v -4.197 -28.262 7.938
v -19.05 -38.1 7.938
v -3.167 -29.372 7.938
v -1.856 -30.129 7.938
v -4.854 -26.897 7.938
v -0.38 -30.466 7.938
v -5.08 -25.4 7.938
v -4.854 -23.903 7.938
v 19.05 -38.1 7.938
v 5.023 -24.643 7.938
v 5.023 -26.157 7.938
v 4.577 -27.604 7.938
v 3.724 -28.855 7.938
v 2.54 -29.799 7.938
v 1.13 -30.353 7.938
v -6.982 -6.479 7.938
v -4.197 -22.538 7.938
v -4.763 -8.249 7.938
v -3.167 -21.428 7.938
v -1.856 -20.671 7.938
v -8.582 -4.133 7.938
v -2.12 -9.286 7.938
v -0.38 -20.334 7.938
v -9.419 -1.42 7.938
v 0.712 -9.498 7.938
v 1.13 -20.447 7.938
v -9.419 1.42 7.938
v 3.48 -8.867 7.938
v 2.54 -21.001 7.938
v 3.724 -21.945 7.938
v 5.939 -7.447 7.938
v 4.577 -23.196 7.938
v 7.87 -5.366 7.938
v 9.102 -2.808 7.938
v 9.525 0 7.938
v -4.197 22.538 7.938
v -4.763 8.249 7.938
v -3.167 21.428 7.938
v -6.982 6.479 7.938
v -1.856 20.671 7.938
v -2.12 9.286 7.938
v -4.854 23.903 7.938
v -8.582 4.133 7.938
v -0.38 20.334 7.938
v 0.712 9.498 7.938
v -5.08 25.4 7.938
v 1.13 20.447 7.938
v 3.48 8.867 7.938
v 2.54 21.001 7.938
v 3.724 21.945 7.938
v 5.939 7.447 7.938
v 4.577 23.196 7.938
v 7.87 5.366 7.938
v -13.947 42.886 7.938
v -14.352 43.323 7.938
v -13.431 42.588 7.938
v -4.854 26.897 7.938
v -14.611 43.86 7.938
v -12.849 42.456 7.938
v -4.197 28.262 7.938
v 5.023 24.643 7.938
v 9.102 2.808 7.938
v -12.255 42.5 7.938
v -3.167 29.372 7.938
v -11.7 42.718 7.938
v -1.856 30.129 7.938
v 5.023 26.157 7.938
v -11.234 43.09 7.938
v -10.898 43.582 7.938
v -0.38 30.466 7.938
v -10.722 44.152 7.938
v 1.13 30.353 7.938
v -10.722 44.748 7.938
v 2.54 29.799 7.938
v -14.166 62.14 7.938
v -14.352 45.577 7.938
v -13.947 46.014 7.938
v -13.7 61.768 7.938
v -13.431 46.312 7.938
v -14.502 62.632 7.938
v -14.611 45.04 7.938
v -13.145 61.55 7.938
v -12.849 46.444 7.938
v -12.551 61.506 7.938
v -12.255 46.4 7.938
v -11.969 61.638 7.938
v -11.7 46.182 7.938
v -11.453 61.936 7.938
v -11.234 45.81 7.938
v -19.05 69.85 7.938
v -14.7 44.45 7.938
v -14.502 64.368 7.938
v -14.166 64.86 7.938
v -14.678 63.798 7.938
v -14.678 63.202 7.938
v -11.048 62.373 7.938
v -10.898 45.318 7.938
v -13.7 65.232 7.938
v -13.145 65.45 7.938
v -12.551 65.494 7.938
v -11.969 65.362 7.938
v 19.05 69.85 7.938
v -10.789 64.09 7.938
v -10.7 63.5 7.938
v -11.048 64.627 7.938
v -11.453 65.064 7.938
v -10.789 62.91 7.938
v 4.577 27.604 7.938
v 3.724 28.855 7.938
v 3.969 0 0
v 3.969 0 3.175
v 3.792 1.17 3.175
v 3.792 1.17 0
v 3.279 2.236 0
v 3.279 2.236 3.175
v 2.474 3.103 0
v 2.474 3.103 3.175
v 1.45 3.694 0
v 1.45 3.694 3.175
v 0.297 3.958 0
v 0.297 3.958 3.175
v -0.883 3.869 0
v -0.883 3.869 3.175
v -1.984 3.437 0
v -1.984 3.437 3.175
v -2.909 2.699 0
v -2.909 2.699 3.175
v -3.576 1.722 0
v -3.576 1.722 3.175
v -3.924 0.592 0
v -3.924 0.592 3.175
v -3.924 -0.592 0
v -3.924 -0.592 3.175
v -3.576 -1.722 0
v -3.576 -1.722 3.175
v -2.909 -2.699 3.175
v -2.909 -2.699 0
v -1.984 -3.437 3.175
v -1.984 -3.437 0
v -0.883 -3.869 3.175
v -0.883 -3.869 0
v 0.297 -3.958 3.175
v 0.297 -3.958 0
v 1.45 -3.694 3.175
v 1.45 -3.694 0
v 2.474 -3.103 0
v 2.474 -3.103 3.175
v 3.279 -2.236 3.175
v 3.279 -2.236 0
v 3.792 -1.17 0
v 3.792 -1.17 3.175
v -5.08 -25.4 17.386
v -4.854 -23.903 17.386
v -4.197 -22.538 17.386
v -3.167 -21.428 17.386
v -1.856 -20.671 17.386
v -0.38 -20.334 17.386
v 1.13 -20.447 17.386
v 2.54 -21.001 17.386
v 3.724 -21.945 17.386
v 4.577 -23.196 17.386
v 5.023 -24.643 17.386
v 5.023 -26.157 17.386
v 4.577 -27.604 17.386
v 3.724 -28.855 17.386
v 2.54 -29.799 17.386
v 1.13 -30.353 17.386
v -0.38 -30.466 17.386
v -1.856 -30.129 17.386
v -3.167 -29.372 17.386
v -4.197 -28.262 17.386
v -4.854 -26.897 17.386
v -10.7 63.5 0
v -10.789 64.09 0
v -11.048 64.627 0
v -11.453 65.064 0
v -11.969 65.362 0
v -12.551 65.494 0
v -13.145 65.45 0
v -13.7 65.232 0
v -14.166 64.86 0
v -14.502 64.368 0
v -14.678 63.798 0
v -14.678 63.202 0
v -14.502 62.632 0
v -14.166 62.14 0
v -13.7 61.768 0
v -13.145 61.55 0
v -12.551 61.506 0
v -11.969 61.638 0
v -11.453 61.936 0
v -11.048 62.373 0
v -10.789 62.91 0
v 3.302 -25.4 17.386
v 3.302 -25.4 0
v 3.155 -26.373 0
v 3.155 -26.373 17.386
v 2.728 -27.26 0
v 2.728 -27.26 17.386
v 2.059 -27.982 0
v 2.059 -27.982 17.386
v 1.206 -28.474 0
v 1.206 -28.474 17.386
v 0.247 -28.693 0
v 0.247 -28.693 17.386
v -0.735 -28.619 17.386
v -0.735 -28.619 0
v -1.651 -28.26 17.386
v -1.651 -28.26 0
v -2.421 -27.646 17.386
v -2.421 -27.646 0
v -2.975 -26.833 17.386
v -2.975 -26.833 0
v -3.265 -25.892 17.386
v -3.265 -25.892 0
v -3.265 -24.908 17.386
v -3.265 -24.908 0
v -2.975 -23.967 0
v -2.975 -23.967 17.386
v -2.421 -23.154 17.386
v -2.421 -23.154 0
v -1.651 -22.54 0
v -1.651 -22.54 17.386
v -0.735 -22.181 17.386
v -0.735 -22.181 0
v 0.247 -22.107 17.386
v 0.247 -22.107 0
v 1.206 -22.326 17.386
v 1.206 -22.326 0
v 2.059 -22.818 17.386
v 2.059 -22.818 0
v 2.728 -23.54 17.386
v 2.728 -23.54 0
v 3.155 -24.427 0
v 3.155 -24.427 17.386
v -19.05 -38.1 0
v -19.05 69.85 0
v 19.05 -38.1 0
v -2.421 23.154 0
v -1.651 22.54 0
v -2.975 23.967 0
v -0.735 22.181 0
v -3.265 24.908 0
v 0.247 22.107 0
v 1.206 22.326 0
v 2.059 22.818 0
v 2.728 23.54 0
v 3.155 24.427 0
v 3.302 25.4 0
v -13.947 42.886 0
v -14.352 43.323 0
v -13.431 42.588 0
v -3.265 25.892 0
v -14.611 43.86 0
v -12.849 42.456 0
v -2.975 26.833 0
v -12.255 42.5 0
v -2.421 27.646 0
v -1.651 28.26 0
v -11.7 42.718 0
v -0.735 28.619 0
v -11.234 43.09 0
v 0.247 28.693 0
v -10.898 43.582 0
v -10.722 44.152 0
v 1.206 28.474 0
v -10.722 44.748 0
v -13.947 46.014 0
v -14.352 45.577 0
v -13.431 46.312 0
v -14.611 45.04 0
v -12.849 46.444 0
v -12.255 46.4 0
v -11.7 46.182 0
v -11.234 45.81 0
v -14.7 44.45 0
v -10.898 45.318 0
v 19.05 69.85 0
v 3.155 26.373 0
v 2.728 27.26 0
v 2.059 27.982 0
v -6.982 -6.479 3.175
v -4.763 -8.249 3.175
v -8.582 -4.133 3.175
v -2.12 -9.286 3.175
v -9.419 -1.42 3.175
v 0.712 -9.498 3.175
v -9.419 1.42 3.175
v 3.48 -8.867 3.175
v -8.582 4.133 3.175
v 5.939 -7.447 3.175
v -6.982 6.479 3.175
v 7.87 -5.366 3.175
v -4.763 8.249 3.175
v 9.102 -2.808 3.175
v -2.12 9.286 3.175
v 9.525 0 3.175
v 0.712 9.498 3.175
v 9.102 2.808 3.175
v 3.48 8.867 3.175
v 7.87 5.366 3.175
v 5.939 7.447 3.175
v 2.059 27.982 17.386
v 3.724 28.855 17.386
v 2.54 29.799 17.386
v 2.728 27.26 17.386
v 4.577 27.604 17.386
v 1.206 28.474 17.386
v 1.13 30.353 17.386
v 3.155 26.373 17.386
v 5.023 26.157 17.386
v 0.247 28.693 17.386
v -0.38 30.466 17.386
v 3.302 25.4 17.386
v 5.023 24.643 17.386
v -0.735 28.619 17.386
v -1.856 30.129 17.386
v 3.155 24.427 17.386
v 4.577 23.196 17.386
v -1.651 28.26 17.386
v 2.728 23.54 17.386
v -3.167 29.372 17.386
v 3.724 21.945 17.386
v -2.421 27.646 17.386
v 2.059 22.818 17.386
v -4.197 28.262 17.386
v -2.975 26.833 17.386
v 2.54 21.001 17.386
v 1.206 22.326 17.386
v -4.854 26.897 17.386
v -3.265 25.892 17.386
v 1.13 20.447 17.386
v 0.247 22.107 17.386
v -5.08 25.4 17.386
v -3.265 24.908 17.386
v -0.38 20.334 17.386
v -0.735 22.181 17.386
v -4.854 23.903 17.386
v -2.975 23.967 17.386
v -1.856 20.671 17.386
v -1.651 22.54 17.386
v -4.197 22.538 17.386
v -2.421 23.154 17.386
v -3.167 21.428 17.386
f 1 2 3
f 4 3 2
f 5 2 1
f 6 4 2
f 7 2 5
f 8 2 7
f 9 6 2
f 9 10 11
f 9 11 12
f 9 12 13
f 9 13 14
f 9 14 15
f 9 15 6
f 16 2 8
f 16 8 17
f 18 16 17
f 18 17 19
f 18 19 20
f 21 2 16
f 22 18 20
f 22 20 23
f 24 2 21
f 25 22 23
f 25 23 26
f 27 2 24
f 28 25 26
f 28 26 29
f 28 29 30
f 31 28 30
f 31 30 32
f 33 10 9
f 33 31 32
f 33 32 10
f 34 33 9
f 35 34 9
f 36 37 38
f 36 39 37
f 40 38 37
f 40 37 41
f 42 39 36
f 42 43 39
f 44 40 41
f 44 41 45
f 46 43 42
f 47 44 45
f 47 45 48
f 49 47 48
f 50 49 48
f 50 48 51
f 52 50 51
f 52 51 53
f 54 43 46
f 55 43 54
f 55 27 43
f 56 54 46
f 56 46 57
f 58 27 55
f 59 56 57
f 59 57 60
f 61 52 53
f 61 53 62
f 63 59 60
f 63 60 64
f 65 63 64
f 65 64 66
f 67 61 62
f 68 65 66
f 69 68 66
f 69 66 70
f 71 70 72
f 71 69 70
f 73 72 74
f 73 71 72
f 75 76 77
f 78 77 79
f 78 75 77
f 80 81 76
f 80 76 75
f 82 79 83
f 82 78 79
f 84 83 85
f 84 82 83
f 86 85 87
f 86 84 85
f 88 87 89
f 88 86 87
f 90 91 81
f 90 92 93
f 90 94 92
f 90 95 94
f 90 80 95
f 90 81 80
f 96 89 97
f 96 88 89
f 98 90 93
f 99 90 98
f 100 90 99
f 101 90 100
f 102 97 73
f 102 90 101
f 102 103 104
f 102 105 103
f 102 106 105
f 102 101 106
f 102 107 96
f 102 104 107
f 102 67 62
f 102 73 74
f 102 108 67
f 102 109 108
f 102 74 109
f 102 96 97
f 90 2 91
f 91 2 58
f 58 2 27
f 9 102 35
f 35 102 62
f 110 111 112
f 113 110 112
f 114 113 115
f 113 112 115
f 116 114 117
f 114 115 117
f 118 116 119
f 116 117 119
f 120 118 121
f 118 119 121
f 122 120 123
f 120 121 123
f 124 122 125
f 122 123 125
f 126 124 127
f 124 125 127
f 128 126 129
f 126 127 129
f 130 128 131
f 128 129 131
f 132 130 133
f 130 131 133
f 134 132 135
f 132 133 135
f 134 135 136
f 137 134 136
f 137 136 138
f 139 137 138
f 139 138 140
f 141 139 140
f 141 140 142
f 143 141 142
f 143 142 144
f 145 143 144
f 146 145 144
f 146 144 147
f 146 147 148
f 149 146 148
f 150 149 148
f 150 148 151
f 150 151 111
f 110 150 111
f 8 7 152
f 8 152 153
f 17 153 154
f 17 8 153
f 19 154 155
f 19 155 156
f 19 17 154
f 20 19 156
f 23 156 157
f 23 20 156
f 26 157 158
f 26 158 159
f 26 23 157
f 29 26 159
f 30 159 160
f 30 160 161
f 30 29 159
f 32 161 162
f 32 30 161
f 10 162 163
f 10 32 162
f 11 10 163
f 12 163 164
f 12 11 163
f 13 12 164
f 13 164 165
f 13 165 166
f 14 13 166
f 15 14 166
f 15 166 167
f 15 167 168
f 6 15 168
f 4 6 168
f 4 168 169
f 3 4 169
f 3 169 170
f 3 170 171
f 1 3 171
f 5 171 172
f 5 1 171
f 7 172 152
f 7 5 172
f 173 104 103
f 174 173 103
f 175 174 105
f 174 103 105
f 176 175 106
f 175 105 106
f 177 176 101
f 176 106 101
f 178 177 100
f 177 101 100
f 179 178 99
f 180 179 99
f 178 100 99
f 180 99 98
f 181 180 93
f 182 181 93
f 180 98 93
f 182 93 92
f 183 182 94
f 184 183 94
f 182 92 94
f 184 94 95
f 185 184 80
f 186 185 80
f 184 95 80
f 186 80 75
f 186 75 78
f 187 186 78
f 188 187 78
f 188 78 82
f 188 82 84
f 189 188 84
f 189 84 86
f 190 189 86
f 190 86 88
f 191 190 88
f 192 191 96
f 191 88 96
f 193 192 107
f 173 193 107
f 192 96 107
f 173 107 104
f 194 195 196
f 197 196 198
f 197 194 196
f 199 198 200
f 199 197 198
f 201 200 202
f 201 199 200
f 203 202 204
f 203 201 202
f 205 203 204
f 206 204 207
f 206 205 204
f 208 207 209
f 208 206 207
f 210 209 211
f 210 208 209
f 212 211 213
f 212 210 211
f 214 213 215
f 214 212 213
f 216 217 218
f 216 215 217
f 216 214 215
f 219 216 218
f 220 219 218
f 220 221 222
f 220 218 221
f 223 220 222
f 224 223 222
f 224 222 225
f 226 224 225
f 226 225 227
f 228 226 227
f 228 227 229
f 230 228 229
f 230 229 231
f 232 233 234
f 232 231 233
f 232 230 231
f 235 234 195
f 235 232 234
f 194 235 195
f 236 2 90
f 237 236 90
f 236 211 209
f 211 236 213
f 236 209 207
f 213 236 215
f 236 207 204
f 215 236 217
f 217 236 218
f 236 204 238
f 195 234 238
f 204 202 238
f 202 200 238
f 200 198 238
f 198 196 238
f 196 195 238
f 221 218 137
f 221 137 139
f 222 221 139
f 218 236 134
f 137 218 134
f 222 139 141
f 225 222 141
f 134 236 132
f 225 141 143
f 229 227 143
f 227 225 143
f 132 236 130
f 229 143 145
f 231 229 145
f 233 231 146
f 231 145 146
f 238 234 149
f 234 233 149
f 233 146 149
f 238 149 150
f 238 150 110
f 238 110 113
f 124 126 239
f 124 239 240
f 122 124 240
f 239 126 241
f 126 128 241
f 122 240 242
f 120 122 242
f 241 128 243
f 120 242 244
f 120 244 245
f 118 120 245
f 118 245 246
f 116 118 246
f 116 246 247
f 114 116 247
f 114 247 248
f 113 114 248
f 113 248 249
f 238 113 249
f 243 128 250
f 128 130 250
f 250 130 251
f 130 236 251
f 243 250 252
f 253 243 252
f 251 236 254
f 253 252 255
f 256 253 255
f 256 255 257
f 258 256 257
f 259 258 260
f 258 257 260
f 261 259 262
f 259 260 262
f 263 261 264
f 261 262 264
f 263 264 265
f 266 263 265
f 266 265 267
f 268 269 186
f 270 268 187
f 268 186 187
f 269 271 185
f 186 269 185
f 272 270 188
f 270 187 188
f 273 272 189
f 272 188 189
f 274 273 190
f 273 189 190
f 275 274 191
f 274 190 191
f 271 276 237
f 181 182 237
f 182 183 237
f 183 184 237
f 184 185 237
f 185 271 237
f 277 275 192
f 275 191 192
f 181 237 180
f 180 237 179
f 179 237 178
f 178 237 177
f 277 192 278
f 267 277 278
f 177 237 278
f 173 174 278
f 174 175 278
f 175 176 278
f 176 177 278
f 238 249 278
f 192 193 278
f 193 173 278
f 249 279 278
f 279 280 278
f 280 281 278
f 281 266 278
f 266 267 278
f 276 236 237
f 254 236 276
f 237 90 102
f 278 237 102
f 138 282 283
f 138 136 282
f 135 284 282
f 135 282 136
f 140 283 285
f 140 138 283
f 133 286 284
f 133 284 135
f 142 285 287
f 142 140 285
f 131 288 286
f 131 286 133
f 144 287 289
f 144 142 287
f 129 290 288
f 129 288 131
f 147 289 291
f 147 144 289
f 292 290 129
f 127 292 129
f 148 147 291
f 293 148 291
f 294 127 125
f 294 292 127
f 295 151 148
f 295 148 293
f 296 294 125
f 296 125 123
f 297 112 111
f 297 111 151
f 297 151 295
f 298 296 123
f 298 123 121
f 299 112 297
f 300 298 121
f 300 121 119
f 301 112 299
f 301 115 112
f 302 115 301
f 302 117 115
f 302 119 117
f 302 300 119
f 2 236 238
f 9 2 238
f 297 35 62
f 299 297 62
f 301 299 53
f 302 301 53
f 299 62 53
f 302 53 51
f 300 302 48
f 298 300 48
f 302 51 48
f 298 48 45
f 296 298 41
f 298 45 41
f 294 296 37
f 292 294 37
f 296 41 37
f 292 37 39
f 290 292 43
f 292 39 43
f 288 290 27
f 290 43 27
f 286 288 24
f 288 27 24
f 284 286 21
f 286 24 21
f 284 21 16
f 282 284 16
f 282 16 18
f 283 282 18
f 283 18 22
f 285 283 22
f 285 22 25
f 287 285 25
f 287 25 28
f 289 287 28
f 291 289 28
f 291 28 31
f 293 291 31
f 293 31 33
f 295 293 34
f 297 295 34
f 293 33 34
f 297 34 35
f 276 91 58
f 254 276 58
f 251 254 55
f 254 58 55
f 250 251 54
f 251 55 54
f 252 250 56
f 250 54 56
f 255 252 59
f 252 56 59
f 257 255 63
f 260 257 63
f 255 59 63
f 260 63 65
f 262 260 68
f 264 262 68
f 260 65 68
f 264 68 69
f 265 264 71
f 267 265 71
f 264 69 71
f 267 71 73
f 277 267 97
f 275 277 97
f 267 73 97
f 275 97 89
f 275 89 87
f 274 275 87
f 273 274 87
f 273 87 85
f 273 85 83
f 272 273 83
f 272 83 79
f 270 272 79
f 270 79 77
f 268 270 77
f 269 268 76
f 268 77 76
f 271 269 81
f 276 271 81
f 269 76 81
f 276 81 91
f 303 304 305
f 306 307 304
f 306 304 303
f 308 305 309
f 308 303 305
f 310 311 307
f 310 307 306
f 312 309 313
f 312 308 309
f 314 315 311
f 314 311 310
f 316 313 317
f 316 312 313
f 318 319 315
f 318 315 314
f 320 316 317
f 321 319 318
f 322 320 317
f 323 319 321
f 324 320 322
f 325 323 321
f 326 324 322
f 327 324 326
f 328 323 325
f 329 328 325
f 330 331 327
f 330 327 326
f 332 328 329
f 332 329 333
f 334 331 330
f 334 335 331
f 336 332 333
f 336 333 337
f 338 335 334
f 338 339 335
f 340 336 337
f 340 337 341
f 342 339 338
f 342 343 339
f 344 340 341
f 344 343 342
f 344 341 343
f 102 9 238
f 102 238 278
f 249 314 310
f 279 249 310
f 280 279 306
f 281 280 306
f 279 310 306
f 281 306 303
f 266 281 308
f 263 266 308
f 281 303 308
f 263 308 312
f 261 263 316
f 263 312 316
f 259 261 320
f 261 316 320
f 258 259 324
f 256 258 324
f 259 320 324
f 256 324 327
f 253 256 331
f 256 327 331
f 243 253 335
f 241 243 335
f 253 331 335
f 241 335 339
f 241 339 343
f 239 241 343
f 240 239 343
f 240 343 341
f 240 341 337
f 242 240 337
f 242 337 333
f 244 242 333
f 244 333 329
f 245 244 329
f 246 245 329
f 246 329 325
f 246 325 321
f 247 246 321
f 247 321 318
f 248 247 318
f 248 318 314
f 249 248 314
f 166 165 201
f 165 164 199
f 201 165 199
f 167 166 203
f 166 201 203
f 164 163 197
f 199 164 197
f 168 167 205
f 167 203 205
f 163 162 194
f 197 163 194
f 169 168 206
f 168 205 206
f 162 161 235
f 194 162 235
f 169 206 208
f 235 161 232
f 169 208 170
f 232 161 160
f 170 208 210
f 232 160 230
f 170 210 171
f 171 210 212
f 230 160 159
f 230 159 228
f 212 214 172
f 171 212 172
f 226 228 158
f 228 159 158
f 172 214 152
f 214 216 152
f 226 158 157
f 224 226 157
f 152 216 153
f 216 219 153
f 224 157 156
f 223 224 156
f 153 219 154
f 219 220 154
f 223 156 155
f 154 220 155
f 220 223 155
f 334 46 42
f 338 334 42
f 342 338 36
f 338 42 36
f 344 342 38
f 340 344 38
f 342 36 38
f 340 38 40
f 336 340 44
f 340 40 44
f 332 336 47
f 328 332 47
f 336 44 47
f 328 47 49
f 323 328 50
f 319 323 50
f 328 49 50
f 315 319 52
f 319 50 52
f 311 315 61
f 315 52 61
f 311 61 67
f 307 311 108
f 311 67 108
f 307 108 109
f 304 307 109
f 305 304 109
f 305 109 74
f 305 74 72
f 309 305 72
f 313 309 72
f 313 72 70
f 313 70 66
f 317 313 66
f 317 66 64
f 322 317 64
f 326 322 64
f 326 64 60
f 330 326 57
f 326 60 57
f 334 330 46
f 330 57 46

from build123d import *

# Parameters (mm, degrees)
SKETCH1_W           = 38.1
SKETCH1_H           = 76.2
BOSS_EXTRUDE1_DEPTH = 7.9375
SKETCH2_R           = 3.96875
CUT_EXTRUDE1_DEPTH  = 44.330317403
SKETCH4_R           = 9.525
CUT_EXTRUDE2_DEPTH  = 4.7625
SKETCH5_R           = 5.08
BOSS_EXTRUDE2_DEPTH = 9.4488
SKETCH6_R           = 3.302
CUT_EXTRUDE3_DEPTH  = 47.008650575
SKETCH7_W           = 38.1
SKETCH7_H           = 31.75
SKETCH7_R           = 2
BOSS_EXTRUDE4_DEPTH = 7.9375


with BuildPart() as part:
    # Sketch1 → Boss-Extrude1 (new body)
    with BuildSketch(Plane.XY):
        Rectangle(SKETCH1_W, SKETCH1_H)
    extrude(amount=BOSS_EXTRUDE1_DEPTH)

    # Sketch2 → Cut-Extrude1 (cut, through all)
    with BuildSketch(Plane.XY.offset(7.9375)):
        Circle(SKETCH2_R)
    extrude(amount=-CUT_EXTRUDE1_DEPTH, mode=Mode.SUBTRACT)

    # Sketch4 → Cut-Extrude2 (cut)
    with BuildSketch(Plane.XY.offset(7.9375)):
        Circle(SKETCH4_R)
    extrude(amount=-CUT_EXTRUDE2_DEPTH, mode=Mode.SUBTRACT)

    # Sketch5 → Boss-Extrude2 (add)
    with BuildSketch(Plane.XY.offset(7.9375)):
        with Locations(Location((0, 25.4, 0), (0, 0, 180))):
            Circle(SKETCH5_R)
    boss_extrude2 = extrude(amount=BOSS_EXTRUDE2_DEPTH)

    # Sketch6 → Cut-Extrude3 (cut, through all)
    with BuildSketch(Plane.XY.offset(17.3863)):
        with Locations((0, 25.4)):
            Circle(SKETCH6_R)
    cut_extrude3 = extrude(amount=-CUT_EXTRUDE3_DEPTH, mode=Mode.SUBTRACT)

    # Mirror1: Boss-Extrude2, Cut-Extrude3 across plane
    add(boss_extrude2.mirror(Plane.ZX))
    add(cut_extrude3.mirror(Plane.ZX), mode=Mode.SUBTRACT)

    # Sketch7 → Boss-Extrude4 (add)
    with BuildSketch(Plane.XY.offset(7.9375)):
        with Locations((0, 53.975)):
            Rectangle(SKETCH7_W, SKETCH7_H)
        with Locations((-12.7, 63.5)):
            Circle(SKETCH7_R, mode=Mode.SUBTRACT)
        with Locations(Location((-12.7, 44.45, 0), (0, 0, 180))):
            Circle(SKETCH7_R, mode=Mode.SUBTRACT)
    extrude(amount=-BOSS_EXTRUDE4_DEPTH)


solid = part.part
